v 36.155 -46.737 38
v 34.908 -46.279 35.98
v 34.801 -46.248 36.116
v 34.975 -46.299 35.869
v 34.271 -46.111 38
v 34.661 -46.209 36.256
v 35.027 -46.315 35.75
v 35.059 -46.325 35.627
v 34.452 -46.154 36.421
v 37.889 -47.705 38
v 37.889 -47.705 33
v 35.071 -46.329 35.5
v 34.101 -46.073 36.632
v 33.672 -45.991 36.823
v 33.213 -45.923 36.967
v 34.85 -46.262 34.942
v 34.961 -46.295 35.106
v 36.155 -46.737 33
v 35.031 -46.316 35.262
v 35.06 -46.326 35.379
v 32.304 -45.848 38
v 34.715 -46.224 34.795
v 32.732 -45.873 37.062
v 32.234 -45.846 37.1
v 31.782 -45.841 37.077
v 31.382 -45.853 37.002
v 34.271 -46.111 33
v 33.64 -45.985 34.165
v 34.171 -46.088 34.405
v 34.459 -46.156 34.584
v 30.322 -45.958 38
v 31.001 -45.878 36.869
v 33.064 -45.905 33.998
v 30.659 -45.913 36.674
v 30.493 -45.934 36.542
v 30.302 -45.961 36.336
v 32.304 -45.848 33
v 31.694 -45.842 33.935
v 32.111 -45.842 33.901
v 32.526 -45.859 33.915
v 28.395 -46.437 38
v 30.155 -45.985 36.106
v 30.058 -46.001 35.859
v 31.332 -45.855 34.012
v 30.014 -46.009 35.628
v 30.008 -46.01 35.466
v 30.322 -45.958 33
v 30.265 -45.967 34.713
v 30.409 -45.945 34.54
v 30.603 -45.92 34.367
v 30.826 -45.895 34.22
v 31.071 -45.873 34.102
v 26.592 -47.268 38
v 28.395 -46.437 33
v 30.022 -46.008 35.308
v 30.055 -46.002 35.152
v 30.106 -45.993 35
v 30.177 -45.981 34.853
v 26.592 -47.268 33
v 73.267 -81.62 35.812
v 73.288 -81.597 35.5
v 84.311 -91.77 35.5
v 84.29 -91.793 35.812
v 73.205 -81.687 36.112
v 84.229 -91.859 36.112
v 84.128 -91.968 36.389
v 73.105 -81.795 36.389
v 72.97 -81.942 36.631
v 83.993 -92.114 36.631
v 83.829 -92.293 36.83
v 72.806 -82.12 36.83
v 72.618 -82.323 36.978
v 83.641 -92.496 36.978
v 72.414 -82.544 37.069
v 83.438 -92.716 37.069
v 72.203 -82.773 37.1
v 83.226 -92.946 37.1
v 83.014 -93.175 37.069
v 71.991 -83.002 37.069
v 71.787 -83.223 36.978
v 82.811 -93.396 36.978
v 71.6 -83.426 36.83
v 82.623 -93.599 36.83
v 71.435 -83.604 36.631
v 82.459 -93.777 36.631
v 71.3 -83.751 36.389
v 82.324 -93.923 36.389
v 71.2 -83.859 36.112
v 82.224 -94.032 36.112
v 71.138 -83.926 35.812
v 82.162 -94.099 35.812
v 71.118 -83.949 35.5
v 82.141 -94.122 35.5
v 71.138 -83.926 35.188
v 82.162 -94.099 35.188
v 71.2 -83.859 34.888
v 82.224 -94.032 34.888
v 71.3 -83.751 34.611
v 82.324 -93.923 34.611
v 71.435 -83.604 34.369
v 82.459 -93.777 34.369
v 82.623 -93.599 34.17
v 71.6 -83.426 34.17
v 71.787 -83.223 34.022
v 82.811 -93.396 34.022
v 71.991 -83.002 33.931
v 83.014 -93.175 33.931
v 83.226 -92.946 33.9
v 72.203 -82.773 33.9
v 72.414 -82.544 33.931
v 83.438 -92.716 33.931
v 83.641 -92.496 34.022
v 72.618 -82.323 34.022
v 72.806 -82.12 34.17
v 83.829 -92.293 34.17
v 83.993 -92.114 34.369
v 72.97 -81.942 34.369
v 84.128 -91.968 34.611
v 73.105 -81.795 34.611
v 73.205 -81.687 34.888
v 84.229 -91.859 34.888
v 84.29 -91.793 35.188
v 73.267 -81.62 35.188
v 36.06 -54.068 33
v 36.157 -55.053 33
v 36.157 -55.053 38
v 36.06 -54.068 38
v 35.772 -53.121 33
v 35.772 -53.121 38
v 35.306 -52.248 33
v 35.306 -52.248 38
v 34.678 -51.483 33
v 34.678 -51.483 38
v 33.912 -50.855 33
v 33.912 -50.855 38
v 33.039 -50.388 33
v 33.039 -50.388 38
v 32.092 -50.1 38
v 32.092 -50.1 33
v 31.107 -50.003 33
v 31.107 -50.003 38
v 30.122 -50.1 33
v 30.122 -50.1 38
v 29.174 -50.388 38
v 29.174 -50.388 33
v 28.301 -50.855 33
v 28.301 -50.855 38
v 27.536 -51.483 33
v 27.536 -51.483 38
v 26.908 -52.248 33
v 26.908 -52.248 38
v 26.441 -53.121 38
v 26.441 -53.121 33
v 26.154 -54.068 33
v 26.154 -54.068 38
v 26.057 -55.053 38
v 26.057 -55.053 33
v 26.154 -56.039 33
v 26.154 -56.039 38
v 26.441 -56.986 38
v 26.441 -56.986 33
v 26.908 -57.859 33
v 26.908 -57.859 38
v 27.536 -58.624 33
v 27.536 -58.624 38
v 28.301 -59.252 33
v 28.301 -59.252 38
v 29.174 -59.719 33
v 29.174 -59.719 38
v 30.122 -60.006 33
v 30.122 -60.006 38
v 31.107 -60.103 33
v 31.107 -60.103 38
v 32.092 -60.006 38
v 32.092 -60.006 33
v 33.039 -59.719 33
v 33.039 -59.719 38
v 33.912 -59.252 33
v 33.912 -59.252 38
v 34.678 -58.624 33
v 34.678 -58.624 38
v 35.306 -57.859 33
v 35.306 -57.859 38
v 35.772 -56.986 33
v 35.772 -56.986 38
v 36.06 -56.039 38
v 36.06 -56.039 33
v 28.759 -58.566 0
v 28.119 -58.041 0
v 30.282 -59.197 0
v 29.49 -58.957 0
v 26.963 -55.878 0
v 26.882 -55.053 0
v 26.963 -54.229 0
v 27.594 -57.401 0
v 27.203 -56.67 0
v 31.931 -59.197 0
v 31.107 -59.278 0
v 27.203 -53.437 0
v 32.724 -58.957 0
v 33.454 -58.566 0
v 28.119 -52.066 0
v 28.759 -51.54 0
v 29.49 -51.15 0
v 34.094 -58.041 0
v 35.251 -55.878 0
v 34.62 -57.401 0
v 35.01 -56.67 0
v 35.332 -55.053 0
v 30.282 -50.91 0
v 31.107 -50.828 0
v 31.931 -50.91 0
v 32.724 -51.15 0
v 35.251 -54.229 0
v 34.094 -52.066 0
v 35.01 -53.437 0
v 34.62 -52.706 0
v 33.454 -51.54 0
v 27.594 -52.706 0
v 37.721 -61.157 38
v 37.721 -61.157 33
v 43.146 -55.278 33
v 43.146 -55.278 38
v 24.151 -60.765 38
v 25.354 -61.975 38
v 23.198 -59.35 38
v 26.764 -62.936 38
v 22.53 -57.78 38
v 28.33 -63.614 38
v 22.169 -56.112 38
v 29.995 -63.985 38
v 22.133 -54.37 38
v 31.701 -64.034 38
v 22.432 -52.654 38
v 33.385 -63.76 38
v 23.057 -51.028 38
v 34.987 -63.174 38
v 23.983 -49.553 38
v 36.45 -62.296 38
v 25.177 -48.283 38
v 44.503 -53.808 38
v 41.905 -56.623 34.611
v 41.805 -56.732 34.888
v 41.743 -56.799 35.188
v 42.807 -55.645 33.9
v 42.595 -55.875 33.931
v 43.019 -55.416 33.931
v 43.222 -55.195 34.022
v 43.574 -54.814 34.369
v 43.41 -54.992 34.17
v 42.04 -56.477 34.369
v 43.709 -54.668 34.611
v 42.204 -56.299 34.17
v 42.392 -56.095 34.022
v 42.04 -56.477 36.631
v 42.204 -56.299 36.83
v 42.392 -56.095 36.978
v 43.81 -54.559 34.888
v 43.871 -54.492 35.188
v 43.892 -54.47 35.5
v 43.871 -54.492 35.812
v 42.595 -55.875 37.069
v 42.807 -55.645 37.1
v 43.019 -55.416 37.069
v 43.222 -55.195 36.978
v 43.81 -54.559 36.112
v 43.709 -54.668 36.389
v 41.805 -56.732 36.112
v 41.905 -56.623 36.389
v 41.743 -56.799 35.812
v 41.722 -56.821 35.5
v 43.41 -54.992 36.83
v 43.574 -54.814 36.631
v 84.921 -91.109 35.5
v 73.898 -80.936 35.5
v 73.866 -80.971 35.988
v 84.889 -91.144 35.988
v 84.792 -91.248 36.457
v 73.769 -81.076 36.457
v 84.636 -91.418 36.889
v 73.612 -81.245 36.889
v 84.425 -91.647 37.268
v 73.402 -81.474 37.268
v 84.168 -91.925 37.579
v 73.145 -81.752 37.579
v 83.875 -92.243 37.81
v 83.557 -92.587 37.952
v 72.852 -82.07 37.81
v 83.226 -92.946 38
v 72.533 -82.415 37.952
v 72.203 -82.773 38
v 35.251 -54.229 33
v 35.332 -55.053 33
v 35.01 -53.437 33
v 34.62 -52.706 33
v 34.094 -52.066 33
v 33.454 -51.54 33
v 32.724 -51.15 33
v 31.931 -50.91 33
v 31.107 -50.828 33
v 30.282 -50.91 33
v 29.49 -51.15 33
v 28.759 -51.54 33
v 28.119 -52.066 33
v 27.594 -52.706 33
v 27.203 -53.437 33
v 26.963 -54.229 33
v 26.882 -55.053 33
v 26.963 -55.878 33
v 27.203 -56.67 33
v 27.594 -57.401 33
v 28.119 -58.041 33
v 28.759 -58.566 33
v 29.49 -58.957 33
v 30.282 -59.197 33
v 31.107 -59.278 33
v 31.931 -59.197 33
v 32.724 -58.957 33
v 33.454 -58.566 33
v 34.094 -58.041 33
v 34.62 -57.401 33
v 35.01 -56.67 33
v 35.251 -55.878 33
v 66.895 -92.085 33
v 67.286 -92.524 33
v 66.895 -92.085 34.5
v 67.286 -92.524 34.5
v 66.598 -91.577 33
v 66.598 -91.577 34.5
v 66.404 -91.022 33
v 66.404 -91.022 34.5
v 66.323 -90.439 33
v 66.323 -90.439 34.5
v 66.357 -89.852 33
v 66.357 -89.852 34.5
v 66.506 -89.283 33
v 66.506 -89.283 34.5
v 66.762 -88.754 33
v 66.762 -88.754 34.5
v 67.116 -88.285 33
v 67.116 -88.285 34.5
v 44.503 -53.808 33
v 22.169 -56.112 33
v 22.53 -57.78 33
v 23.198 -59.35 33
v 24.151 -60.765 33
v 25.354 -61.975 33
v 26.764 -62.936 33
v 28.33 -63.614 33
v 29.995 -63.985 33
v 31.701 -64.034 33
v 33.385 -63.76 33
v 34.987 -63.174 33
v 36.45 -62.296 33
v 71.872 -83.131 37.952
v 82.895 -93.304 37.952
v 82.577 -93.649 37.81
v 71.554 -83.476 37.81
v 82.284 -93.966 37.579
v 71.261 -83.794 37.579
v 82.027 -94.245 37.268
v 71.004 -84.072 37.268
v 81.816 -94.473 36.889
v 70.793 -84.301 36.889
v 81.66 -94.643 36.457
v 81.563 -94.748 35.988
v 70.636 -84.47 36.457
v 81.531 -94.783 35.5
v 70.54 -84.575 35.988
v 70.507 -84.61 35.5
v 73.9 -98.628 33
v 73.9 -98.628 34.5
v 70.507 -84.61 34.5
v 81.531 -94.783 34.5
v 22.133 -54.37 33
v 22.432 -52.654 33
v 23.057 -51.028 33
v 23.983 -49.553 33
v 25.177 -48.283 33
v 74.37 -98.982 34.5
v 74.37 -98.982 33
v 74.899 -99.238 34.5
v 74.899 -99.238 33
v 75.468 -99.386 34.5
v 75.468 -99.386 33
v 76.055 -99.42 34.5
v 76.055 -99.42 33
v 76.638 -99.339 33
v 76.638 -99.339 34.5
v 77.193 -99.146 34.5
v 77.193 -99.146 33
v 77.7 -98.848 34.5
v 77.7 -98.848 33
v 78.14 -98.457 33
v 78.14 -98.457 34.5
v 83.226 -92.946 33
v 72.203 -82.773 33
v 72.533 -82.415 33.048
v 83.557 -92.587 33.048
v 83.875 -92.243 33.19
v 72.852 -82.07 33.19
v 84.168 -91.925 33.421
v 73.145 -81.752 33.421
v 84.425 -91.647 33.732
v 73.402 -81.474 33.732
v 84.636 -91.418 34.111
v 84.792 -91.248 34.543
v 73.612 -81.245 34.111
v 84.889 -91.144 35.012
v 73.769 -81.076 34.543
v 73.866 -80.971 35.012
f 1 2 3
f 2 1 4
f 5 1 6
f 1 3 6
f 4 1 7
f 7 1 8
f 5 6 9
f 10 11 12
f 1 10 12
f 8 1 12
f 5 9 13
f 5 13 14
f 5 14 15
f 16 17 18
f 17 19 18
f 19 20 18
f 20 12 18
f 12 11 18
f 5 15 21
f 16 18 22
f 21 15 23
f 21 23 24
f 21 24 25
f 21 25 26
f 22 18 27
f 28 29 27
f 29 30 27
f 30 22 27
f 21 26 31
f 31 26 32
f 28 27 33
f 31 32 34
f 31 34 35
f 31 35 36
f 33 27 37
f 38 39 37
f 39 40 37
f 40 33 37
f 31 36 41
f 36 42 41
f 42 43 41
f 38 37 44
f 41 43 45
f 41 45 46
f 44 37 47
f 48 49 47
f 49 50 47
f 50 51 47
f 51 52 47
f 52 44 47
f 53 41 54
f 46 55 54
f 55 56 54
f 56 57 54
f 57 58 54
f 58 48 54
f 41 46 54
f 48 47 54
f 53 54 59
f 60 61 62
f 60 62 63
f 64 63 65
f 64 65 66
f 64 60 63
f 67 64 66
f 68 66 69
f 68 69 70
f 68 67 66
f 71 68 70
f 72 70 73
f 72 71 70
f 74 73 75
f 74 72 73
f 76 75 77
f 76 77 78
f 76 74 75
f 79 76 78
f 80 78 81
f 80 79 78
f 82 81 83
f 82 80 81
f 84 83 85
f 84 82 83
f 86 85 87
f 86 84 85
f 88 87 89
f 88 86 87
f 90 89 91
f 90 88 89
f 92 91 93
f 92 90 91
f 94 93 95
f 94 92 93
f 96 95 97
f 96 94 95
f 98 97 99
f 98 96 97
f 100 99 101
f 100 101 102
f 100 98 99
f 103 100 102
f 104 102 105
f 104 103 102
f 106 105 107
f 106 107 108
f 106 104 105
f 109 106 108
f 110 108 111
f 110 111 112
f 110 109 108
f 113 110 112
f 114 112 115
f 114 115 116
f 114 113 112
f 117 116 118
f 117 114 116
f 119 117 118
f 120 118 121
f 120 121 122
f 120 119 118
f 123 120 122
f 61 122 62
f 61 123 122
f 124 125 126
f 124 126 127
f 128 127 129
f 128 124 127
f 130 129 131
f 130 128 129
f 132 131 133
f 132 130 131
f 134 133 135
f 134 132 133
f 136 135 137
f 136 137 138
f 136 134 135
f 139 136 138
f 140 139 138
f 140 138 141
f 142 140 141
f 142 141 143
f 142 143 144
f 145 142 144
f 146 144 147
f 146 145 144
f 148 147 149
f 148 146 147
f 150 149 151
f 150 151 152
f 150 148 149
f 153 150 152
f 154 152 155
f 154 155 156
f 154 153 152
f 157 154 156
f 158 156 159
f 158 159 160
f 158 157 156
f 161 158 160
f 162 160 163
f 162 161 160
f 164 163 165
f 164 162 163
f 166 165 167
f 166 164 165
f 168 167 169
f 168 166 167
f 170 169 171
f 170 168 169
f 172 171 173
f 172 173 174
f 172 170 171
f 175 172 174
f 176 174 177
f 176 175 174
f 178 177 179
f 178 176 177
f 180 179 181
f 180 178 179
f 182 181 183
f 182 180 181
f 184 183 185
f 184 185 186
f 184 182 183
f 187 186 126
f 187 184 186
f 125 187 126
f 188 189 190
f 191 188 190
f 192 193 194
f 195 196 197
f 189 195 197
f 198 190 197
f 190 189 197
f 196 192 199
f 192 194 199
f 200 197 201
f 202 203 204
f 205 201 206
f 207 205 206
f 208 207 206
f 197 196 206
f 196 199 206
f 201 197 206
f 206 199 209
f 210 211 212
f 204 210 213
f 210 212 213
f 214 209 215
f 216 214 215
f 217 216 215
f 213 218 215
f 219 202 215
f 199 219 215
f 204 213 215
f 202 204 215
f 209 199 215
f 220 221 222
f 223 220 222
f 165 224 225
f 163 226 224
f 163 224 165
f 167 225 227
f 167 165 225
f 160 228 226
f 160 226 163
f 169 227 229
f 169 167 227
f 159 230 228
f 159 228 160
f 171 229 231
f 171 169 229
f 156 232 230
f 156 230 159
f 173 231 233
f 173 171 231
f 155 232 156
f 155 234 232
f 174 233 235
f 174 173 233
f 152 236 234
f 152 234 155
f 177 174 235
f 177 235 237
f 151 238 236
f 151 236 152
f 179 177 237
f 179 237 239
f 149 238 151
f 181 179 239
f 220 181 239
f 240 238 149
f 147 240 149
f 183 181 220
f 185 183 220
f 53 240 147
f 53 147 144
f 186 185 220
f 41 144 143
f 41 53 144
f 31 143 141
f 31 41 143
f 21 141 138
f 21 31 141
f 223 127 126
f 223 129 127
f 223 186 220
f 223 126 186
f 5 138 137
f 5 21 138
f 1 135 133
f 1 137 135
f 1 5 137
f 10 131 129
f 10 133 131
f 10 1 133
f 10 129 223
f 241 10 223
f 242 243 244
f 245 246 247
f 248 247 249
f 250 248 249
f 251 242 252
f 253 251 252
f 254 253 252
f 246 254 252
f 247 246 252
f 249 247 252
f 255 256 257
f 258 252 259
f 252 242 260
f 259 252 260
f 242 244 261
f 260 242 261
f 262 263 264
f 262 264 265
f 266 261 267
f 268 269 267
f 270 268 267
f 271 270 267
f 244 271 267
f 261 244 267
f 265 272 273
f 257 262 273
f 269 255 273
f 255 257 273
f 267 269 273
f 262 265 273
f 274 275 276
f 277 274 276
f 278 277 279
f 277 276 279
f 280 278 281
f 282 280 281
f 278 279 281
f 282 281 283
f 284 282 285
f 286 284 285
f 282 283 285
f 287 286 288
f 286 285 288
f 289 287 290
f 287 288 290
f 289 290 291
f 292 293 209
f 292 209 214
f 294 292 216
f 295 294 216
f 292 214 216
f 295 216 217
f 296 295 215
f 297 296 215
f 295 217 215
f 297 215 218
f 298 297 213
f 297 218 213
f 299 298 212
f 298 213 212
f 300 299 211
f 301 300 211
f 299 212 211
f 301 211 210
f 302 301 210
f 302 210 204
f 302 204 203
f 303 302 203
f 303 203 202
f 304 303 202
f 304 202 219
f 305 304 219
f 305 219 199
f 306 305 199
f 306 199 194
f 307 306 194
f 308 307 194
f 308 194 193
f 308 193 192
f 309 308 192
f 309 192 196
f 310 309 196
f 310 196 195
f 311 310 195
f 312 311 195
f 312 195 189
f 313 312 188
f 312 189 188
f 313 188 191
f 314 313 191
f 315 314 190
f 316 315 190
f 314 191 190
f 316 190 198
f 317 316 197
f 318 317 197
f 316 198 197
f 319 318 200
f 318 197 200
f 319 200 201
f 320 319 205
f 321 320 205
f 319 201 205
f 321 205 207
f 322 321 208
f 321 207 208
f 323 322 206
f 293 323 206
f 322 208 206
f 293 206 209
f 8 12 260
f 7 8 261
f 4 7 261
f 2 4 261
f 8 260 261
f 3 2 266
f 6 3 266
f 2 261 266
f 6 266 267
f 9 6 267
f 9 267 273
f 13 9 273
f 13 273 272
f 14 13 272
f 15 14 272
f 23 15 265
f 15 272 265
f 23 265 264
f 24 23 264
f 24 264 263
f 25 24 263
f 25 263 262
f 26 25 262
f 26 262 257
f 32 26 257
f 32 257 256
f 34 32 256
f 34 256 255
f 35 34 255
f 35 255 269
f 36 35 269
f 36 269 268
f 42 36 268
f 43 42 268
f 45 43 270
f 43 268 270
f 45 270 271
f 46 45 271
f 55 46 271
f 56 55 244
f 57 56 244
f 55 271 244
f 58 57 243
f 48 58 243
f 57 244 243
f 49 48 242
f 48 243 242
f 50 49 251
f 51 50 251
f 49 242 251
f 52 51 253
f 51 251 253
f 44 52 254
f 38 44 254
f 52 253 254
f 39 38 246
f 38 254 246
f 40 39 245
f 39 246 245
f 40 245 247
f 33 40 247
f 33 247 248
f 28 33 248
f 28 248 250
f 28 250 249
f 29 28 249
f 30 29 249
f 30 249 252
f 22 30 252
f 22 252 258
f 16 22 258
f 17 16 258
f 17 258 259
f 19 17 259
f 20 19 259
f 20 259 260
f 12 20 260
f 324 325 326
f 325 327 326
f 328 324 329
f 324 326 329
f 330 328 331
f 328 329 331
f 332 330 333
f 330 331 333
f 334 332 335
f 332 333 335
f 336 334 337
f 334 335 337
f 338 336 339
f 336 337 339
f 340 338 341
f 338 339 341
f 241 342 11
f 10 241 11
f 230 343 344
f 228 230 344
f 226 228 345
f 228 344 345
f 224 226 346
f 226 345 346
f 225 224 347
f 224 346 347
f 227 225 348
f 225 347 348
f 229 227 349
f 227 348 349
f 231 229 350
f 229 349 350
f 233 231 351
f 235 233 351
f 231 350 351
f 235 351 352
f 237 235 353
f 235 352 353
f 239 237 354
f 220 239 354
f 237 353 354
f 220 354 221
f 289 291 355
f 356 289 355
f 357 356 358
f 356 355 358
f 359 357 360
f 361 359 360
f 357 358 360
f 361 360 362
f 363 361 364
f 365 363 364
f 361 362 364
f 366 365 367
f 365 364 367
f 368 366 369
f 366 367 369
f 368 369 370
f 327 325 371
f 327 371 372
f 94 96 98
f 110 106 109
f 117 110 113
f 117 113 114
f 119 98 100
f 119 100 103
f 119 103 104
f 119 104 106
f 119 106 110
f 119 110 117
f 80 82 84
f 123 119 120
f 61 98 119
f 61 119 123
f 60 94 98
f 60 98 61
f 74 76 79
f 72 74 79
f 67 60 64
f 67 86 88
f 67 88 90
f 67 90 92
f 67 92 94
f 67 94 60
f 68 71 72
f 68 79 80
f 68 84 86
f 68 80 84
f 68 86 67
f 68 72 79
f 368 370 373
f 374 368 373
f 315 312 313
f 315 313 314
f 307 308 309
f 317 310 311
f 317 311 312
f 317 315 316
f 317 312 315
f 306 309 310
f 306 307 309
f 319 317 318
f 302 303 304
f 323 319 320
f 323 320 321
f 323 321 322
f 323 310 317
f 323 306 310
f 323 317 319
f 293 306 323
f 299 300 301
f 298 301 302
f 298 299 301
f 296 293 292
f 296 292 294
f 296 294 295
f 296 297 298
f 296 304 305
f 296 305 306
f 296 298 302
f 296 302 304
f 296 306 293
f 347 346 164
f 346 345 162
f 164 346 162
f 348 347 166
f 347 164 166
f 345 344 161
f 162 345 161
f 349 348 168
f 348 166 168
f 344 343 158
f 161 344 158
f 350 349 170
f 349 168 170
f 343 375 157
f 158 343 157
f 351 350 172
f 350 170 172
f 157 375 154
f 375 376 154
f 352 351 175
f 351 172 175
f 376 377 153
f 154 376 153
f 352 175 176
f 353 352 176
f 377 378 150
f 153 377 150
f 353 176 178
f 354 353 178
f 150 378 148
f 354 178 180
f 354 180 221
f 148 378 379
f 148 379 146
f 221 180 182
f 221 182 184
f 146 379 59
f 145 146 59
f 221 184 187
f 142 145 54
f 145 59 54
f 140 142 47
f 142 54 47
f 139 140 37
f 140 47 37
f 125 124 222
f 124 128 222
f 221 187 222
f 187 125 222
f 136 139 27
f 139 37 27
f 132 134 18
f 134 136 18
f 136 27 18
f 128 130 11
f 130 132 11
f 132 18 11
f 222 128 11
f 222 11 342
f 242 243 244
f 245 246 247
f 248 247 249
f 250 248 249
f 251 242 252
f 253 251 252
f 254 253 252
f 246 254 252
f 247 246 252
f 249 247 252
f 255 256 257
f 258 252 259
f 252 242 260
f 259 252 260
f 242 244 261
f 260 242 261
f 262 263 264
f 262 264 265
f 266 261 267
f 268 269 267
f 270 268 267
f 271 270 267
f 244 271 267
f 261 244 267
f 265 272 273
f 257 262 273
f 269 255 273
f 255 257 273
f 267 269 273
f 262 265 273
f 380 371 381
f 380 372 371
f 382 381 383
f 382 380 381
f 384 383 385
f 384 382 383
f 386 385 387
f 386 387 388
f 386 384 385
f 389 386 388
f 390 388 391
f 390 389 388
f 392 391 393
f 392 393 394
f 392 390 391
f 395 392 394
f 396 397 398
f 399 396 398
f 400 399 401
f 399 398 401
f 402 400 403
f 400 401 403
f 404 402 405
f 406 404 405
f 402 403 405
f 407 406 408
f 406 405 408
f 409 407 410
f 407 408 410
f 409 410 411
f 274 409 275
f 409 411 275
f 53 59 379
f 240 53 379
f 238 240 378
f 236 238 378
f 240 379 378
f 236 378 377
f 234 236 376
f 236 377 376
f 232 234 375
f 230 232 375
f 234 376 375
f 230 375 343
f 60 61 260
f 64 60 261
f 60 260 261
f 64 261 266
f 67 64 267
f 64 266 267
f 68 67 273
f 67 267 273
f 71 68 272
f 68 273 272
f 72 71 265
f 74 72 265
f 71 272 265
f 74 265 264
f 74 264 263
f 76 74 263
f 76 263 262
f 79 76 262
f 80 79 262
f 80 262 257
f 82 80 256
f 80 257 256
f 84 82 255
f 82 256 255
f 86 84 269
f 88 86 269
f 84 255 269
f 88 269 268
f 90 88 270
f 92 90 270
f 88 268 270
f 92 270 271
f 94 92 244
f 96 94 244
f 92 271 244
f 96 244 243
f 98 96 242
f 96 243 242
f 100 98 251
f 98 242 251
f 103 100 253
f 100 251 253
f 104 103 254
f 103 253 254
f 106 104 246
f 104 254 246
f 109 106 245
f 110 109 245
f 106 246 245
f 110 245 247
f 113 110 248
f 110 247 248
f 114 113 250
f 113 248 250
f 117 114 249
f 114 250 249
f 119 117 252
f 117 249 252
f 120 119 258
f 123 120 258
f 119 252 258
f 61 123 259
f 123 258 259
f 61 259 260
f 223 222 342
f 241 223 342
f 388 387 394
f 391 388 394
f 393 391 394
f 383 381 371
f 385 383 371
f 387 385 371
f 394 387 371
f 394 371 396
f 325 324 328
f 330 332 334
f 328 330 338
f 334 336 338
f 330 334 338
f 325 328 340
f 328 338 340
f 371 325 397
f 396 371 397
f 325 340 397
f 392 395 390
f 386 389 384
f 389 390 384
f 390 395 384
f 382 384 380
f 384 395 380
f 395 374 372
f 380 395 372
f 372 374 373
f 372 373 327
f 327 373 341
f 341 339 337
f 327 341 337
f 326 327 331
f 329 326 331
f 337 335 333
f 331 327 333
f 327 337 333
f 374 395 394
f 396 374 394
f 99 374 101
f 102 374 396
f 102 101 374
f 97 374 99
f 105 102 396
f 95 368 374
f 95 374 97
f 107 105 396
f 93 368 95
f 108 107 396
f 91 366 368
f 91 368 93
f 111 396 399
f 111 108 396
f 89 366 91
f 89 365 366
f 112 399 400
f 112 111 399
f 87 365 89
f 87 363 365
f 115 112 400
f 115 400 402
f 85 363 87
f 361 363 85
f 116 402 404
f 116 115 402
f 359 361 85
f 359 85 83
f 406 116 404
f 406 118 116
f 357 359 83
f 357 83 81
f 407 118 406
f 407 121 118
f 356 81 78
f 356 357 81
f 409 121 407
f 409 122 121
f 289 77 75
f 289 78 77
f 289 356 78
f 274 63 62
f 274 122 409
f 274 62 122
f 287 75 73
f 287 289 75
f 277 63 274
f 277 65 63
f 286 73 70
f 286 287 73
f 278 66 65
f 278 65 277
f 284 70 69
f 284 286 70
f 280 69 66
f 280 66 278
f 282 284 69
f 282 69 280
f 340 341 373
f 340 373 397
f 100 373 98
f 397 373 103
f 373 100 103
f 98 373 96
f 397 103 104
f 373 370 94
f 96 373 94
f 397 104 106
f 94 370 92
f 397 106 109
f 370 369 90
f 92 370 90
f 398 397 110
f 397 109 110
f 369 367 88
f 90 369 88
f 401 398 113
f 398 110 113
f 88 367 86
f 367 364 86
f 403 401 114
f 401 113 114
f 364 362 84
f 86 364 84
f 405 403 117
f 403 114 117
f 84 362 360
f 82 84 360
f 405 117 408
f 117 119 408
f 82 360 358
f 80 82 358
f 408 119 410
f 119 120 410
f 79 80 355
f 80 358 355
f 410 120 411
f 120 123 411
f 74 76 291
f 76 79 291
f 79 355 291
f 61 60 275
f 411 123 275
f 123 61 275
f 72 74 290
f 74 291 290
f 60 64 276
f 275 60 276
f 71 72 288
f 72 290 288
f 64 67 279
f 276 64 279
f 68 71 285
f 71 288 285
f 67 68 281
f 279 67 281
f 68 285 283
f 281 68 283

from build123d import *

# Parameters (mm, degrees)
F0_R     = 4.225
F1_DEPTH = 33
F0_R_2   = 5
F2_DEPTH = 5
F3_R     = 5.05
F4_DEPTH = 5
F5_R     = 1.6
F6_DEPTH = 21.863244
F7_DEPTH = 40
F8_W     = 3
F8_H     = 1.5
F8_R     = 1.6
F9_DEPTH = 15
F10_R    = 3


with BuildPart() as f1:
    # F0 (on Top) → F1 (new body)
    with BuildSketch(Plane.XY):
        with Locations((31.106739, -55.053444)):
            Circle(F0_R)
    extrude(amount=F1_DEPTH)

    # F0 (on Top) → F2 (cut)
    with BuildSketch(Plane.XY):
        with Locations((31.106739, -55.053444)):
            Circle(F0_R_2)
        with Locations((31.106739, -55.053444)):
            Circle(F0_R, mode=Mode.SUBTRACT)
    extrude(amount=F2_DEPTH, mode=Mode.SUBTRACT)


with BuildPart() as f4:
    # F3 (on face) → F4 (new body)
    with BuildSketch(Plane.XY.offset(33)):
        with BuildLine():
            ThreePointArc((26.592029, -47.267726), (23.057133, -51.028044), (22.169214, -56.112046))
            ThreePointArc((22.169214, -56.112046), (28.329525, -63.614231), (37.720738, -61.157133))
            Line((37.720738, -61.157133), (43.146239, -55.278023))
            Line((43.146239, -55.278023), (44.502614, -53.808245))
            Line((44.502614, -53.808245), (37.888616, -47.704556))
            ThreePointArc((37.888616, -47.704556), (32.303661, -45.848184), (26.592029, -47.267726))
        make_face()
        with Locations((31.106739, -55.053444)):
            Circle(F3_R, mode=Mode.SUBTRACT)
    extrude(amount=F4_DEPTH)

    # F5 (on face) → F6 (cut, through all)
    with BuildSketch(Plane(origin=(50.851774, -46.928253, 0), x_dir=(0.678188, 0.734889, 0), z_dir=(0.734889, -0.678188, 0))):
        with Locations((-11.86195, 35.5)):
            Circle(F5_R)
    extrude(amount=-F6_DEPTH, mode=Mode.SUBTRACT)


with BuildPart() as f7:
    # F5 (on face) → F7 (new body)
    with BuildSketch(Plane(origin=(50.851774, -46.928253, 0), x_dir=(0.678188, 0.734889, 0), z_dir=(0.734889, -0.678188, 0))):
        with Locations((-11.86195, 35.5)):
            Circle(F5_R)
    extrude(amount=F7_DEPTH)


with BuildPart() as f9:
    # F8 (on face) → F9 (new body)
    with BuildSketch(Plane(origin=(80.247324, -74.05576, 0), x_dir=(0.678188, 0.734889, 0), z_dir=(0.734889, -0.678188, 0))):
        with Locations((-20.86195, 33.75)):
            Rectangle(F8_W, F8_H)
        with BuildLine():
            Line((-19.36195, 34.5), (-19.36195, 33))
            Line((-19.36195, 33), (-11.86195, 33))
            ThreePointArc((-11.86195, 33), (-10.094183, 33.732233), (-9.36195, 35.5))
            ThreePointArc((-9.36195, 35.5), (-10.094183, 37.267767), (-11.86195, 38))
            ThreePointArc((-11.86195, 38), (-13.629717, 37.267767), (-14.36195, 35.5))
            Line((-14.36195, 35.5), (-14.36195, 34.5))
            Line((-14.36195, 34.5), (-19.36195, 34.5))
        make_face()
        with Locations((-11.86195, 35.5)):
            Circle(F8_R, mode=Mode.SUBTRACT)
    extrude(amount=F9_DEPTH)

    # F10
    f10_edges = [f9.edges().sort_by_distance(p)[0] for p in [
        (76.105057, -100.662121, 33.75),
        (65.081725, -90.489306, 33.75),
    ]]
    fillet(f10_edges, radius=F10_R)


solid = Compound([f1.part, f4.part, f7.part, f9.part])
